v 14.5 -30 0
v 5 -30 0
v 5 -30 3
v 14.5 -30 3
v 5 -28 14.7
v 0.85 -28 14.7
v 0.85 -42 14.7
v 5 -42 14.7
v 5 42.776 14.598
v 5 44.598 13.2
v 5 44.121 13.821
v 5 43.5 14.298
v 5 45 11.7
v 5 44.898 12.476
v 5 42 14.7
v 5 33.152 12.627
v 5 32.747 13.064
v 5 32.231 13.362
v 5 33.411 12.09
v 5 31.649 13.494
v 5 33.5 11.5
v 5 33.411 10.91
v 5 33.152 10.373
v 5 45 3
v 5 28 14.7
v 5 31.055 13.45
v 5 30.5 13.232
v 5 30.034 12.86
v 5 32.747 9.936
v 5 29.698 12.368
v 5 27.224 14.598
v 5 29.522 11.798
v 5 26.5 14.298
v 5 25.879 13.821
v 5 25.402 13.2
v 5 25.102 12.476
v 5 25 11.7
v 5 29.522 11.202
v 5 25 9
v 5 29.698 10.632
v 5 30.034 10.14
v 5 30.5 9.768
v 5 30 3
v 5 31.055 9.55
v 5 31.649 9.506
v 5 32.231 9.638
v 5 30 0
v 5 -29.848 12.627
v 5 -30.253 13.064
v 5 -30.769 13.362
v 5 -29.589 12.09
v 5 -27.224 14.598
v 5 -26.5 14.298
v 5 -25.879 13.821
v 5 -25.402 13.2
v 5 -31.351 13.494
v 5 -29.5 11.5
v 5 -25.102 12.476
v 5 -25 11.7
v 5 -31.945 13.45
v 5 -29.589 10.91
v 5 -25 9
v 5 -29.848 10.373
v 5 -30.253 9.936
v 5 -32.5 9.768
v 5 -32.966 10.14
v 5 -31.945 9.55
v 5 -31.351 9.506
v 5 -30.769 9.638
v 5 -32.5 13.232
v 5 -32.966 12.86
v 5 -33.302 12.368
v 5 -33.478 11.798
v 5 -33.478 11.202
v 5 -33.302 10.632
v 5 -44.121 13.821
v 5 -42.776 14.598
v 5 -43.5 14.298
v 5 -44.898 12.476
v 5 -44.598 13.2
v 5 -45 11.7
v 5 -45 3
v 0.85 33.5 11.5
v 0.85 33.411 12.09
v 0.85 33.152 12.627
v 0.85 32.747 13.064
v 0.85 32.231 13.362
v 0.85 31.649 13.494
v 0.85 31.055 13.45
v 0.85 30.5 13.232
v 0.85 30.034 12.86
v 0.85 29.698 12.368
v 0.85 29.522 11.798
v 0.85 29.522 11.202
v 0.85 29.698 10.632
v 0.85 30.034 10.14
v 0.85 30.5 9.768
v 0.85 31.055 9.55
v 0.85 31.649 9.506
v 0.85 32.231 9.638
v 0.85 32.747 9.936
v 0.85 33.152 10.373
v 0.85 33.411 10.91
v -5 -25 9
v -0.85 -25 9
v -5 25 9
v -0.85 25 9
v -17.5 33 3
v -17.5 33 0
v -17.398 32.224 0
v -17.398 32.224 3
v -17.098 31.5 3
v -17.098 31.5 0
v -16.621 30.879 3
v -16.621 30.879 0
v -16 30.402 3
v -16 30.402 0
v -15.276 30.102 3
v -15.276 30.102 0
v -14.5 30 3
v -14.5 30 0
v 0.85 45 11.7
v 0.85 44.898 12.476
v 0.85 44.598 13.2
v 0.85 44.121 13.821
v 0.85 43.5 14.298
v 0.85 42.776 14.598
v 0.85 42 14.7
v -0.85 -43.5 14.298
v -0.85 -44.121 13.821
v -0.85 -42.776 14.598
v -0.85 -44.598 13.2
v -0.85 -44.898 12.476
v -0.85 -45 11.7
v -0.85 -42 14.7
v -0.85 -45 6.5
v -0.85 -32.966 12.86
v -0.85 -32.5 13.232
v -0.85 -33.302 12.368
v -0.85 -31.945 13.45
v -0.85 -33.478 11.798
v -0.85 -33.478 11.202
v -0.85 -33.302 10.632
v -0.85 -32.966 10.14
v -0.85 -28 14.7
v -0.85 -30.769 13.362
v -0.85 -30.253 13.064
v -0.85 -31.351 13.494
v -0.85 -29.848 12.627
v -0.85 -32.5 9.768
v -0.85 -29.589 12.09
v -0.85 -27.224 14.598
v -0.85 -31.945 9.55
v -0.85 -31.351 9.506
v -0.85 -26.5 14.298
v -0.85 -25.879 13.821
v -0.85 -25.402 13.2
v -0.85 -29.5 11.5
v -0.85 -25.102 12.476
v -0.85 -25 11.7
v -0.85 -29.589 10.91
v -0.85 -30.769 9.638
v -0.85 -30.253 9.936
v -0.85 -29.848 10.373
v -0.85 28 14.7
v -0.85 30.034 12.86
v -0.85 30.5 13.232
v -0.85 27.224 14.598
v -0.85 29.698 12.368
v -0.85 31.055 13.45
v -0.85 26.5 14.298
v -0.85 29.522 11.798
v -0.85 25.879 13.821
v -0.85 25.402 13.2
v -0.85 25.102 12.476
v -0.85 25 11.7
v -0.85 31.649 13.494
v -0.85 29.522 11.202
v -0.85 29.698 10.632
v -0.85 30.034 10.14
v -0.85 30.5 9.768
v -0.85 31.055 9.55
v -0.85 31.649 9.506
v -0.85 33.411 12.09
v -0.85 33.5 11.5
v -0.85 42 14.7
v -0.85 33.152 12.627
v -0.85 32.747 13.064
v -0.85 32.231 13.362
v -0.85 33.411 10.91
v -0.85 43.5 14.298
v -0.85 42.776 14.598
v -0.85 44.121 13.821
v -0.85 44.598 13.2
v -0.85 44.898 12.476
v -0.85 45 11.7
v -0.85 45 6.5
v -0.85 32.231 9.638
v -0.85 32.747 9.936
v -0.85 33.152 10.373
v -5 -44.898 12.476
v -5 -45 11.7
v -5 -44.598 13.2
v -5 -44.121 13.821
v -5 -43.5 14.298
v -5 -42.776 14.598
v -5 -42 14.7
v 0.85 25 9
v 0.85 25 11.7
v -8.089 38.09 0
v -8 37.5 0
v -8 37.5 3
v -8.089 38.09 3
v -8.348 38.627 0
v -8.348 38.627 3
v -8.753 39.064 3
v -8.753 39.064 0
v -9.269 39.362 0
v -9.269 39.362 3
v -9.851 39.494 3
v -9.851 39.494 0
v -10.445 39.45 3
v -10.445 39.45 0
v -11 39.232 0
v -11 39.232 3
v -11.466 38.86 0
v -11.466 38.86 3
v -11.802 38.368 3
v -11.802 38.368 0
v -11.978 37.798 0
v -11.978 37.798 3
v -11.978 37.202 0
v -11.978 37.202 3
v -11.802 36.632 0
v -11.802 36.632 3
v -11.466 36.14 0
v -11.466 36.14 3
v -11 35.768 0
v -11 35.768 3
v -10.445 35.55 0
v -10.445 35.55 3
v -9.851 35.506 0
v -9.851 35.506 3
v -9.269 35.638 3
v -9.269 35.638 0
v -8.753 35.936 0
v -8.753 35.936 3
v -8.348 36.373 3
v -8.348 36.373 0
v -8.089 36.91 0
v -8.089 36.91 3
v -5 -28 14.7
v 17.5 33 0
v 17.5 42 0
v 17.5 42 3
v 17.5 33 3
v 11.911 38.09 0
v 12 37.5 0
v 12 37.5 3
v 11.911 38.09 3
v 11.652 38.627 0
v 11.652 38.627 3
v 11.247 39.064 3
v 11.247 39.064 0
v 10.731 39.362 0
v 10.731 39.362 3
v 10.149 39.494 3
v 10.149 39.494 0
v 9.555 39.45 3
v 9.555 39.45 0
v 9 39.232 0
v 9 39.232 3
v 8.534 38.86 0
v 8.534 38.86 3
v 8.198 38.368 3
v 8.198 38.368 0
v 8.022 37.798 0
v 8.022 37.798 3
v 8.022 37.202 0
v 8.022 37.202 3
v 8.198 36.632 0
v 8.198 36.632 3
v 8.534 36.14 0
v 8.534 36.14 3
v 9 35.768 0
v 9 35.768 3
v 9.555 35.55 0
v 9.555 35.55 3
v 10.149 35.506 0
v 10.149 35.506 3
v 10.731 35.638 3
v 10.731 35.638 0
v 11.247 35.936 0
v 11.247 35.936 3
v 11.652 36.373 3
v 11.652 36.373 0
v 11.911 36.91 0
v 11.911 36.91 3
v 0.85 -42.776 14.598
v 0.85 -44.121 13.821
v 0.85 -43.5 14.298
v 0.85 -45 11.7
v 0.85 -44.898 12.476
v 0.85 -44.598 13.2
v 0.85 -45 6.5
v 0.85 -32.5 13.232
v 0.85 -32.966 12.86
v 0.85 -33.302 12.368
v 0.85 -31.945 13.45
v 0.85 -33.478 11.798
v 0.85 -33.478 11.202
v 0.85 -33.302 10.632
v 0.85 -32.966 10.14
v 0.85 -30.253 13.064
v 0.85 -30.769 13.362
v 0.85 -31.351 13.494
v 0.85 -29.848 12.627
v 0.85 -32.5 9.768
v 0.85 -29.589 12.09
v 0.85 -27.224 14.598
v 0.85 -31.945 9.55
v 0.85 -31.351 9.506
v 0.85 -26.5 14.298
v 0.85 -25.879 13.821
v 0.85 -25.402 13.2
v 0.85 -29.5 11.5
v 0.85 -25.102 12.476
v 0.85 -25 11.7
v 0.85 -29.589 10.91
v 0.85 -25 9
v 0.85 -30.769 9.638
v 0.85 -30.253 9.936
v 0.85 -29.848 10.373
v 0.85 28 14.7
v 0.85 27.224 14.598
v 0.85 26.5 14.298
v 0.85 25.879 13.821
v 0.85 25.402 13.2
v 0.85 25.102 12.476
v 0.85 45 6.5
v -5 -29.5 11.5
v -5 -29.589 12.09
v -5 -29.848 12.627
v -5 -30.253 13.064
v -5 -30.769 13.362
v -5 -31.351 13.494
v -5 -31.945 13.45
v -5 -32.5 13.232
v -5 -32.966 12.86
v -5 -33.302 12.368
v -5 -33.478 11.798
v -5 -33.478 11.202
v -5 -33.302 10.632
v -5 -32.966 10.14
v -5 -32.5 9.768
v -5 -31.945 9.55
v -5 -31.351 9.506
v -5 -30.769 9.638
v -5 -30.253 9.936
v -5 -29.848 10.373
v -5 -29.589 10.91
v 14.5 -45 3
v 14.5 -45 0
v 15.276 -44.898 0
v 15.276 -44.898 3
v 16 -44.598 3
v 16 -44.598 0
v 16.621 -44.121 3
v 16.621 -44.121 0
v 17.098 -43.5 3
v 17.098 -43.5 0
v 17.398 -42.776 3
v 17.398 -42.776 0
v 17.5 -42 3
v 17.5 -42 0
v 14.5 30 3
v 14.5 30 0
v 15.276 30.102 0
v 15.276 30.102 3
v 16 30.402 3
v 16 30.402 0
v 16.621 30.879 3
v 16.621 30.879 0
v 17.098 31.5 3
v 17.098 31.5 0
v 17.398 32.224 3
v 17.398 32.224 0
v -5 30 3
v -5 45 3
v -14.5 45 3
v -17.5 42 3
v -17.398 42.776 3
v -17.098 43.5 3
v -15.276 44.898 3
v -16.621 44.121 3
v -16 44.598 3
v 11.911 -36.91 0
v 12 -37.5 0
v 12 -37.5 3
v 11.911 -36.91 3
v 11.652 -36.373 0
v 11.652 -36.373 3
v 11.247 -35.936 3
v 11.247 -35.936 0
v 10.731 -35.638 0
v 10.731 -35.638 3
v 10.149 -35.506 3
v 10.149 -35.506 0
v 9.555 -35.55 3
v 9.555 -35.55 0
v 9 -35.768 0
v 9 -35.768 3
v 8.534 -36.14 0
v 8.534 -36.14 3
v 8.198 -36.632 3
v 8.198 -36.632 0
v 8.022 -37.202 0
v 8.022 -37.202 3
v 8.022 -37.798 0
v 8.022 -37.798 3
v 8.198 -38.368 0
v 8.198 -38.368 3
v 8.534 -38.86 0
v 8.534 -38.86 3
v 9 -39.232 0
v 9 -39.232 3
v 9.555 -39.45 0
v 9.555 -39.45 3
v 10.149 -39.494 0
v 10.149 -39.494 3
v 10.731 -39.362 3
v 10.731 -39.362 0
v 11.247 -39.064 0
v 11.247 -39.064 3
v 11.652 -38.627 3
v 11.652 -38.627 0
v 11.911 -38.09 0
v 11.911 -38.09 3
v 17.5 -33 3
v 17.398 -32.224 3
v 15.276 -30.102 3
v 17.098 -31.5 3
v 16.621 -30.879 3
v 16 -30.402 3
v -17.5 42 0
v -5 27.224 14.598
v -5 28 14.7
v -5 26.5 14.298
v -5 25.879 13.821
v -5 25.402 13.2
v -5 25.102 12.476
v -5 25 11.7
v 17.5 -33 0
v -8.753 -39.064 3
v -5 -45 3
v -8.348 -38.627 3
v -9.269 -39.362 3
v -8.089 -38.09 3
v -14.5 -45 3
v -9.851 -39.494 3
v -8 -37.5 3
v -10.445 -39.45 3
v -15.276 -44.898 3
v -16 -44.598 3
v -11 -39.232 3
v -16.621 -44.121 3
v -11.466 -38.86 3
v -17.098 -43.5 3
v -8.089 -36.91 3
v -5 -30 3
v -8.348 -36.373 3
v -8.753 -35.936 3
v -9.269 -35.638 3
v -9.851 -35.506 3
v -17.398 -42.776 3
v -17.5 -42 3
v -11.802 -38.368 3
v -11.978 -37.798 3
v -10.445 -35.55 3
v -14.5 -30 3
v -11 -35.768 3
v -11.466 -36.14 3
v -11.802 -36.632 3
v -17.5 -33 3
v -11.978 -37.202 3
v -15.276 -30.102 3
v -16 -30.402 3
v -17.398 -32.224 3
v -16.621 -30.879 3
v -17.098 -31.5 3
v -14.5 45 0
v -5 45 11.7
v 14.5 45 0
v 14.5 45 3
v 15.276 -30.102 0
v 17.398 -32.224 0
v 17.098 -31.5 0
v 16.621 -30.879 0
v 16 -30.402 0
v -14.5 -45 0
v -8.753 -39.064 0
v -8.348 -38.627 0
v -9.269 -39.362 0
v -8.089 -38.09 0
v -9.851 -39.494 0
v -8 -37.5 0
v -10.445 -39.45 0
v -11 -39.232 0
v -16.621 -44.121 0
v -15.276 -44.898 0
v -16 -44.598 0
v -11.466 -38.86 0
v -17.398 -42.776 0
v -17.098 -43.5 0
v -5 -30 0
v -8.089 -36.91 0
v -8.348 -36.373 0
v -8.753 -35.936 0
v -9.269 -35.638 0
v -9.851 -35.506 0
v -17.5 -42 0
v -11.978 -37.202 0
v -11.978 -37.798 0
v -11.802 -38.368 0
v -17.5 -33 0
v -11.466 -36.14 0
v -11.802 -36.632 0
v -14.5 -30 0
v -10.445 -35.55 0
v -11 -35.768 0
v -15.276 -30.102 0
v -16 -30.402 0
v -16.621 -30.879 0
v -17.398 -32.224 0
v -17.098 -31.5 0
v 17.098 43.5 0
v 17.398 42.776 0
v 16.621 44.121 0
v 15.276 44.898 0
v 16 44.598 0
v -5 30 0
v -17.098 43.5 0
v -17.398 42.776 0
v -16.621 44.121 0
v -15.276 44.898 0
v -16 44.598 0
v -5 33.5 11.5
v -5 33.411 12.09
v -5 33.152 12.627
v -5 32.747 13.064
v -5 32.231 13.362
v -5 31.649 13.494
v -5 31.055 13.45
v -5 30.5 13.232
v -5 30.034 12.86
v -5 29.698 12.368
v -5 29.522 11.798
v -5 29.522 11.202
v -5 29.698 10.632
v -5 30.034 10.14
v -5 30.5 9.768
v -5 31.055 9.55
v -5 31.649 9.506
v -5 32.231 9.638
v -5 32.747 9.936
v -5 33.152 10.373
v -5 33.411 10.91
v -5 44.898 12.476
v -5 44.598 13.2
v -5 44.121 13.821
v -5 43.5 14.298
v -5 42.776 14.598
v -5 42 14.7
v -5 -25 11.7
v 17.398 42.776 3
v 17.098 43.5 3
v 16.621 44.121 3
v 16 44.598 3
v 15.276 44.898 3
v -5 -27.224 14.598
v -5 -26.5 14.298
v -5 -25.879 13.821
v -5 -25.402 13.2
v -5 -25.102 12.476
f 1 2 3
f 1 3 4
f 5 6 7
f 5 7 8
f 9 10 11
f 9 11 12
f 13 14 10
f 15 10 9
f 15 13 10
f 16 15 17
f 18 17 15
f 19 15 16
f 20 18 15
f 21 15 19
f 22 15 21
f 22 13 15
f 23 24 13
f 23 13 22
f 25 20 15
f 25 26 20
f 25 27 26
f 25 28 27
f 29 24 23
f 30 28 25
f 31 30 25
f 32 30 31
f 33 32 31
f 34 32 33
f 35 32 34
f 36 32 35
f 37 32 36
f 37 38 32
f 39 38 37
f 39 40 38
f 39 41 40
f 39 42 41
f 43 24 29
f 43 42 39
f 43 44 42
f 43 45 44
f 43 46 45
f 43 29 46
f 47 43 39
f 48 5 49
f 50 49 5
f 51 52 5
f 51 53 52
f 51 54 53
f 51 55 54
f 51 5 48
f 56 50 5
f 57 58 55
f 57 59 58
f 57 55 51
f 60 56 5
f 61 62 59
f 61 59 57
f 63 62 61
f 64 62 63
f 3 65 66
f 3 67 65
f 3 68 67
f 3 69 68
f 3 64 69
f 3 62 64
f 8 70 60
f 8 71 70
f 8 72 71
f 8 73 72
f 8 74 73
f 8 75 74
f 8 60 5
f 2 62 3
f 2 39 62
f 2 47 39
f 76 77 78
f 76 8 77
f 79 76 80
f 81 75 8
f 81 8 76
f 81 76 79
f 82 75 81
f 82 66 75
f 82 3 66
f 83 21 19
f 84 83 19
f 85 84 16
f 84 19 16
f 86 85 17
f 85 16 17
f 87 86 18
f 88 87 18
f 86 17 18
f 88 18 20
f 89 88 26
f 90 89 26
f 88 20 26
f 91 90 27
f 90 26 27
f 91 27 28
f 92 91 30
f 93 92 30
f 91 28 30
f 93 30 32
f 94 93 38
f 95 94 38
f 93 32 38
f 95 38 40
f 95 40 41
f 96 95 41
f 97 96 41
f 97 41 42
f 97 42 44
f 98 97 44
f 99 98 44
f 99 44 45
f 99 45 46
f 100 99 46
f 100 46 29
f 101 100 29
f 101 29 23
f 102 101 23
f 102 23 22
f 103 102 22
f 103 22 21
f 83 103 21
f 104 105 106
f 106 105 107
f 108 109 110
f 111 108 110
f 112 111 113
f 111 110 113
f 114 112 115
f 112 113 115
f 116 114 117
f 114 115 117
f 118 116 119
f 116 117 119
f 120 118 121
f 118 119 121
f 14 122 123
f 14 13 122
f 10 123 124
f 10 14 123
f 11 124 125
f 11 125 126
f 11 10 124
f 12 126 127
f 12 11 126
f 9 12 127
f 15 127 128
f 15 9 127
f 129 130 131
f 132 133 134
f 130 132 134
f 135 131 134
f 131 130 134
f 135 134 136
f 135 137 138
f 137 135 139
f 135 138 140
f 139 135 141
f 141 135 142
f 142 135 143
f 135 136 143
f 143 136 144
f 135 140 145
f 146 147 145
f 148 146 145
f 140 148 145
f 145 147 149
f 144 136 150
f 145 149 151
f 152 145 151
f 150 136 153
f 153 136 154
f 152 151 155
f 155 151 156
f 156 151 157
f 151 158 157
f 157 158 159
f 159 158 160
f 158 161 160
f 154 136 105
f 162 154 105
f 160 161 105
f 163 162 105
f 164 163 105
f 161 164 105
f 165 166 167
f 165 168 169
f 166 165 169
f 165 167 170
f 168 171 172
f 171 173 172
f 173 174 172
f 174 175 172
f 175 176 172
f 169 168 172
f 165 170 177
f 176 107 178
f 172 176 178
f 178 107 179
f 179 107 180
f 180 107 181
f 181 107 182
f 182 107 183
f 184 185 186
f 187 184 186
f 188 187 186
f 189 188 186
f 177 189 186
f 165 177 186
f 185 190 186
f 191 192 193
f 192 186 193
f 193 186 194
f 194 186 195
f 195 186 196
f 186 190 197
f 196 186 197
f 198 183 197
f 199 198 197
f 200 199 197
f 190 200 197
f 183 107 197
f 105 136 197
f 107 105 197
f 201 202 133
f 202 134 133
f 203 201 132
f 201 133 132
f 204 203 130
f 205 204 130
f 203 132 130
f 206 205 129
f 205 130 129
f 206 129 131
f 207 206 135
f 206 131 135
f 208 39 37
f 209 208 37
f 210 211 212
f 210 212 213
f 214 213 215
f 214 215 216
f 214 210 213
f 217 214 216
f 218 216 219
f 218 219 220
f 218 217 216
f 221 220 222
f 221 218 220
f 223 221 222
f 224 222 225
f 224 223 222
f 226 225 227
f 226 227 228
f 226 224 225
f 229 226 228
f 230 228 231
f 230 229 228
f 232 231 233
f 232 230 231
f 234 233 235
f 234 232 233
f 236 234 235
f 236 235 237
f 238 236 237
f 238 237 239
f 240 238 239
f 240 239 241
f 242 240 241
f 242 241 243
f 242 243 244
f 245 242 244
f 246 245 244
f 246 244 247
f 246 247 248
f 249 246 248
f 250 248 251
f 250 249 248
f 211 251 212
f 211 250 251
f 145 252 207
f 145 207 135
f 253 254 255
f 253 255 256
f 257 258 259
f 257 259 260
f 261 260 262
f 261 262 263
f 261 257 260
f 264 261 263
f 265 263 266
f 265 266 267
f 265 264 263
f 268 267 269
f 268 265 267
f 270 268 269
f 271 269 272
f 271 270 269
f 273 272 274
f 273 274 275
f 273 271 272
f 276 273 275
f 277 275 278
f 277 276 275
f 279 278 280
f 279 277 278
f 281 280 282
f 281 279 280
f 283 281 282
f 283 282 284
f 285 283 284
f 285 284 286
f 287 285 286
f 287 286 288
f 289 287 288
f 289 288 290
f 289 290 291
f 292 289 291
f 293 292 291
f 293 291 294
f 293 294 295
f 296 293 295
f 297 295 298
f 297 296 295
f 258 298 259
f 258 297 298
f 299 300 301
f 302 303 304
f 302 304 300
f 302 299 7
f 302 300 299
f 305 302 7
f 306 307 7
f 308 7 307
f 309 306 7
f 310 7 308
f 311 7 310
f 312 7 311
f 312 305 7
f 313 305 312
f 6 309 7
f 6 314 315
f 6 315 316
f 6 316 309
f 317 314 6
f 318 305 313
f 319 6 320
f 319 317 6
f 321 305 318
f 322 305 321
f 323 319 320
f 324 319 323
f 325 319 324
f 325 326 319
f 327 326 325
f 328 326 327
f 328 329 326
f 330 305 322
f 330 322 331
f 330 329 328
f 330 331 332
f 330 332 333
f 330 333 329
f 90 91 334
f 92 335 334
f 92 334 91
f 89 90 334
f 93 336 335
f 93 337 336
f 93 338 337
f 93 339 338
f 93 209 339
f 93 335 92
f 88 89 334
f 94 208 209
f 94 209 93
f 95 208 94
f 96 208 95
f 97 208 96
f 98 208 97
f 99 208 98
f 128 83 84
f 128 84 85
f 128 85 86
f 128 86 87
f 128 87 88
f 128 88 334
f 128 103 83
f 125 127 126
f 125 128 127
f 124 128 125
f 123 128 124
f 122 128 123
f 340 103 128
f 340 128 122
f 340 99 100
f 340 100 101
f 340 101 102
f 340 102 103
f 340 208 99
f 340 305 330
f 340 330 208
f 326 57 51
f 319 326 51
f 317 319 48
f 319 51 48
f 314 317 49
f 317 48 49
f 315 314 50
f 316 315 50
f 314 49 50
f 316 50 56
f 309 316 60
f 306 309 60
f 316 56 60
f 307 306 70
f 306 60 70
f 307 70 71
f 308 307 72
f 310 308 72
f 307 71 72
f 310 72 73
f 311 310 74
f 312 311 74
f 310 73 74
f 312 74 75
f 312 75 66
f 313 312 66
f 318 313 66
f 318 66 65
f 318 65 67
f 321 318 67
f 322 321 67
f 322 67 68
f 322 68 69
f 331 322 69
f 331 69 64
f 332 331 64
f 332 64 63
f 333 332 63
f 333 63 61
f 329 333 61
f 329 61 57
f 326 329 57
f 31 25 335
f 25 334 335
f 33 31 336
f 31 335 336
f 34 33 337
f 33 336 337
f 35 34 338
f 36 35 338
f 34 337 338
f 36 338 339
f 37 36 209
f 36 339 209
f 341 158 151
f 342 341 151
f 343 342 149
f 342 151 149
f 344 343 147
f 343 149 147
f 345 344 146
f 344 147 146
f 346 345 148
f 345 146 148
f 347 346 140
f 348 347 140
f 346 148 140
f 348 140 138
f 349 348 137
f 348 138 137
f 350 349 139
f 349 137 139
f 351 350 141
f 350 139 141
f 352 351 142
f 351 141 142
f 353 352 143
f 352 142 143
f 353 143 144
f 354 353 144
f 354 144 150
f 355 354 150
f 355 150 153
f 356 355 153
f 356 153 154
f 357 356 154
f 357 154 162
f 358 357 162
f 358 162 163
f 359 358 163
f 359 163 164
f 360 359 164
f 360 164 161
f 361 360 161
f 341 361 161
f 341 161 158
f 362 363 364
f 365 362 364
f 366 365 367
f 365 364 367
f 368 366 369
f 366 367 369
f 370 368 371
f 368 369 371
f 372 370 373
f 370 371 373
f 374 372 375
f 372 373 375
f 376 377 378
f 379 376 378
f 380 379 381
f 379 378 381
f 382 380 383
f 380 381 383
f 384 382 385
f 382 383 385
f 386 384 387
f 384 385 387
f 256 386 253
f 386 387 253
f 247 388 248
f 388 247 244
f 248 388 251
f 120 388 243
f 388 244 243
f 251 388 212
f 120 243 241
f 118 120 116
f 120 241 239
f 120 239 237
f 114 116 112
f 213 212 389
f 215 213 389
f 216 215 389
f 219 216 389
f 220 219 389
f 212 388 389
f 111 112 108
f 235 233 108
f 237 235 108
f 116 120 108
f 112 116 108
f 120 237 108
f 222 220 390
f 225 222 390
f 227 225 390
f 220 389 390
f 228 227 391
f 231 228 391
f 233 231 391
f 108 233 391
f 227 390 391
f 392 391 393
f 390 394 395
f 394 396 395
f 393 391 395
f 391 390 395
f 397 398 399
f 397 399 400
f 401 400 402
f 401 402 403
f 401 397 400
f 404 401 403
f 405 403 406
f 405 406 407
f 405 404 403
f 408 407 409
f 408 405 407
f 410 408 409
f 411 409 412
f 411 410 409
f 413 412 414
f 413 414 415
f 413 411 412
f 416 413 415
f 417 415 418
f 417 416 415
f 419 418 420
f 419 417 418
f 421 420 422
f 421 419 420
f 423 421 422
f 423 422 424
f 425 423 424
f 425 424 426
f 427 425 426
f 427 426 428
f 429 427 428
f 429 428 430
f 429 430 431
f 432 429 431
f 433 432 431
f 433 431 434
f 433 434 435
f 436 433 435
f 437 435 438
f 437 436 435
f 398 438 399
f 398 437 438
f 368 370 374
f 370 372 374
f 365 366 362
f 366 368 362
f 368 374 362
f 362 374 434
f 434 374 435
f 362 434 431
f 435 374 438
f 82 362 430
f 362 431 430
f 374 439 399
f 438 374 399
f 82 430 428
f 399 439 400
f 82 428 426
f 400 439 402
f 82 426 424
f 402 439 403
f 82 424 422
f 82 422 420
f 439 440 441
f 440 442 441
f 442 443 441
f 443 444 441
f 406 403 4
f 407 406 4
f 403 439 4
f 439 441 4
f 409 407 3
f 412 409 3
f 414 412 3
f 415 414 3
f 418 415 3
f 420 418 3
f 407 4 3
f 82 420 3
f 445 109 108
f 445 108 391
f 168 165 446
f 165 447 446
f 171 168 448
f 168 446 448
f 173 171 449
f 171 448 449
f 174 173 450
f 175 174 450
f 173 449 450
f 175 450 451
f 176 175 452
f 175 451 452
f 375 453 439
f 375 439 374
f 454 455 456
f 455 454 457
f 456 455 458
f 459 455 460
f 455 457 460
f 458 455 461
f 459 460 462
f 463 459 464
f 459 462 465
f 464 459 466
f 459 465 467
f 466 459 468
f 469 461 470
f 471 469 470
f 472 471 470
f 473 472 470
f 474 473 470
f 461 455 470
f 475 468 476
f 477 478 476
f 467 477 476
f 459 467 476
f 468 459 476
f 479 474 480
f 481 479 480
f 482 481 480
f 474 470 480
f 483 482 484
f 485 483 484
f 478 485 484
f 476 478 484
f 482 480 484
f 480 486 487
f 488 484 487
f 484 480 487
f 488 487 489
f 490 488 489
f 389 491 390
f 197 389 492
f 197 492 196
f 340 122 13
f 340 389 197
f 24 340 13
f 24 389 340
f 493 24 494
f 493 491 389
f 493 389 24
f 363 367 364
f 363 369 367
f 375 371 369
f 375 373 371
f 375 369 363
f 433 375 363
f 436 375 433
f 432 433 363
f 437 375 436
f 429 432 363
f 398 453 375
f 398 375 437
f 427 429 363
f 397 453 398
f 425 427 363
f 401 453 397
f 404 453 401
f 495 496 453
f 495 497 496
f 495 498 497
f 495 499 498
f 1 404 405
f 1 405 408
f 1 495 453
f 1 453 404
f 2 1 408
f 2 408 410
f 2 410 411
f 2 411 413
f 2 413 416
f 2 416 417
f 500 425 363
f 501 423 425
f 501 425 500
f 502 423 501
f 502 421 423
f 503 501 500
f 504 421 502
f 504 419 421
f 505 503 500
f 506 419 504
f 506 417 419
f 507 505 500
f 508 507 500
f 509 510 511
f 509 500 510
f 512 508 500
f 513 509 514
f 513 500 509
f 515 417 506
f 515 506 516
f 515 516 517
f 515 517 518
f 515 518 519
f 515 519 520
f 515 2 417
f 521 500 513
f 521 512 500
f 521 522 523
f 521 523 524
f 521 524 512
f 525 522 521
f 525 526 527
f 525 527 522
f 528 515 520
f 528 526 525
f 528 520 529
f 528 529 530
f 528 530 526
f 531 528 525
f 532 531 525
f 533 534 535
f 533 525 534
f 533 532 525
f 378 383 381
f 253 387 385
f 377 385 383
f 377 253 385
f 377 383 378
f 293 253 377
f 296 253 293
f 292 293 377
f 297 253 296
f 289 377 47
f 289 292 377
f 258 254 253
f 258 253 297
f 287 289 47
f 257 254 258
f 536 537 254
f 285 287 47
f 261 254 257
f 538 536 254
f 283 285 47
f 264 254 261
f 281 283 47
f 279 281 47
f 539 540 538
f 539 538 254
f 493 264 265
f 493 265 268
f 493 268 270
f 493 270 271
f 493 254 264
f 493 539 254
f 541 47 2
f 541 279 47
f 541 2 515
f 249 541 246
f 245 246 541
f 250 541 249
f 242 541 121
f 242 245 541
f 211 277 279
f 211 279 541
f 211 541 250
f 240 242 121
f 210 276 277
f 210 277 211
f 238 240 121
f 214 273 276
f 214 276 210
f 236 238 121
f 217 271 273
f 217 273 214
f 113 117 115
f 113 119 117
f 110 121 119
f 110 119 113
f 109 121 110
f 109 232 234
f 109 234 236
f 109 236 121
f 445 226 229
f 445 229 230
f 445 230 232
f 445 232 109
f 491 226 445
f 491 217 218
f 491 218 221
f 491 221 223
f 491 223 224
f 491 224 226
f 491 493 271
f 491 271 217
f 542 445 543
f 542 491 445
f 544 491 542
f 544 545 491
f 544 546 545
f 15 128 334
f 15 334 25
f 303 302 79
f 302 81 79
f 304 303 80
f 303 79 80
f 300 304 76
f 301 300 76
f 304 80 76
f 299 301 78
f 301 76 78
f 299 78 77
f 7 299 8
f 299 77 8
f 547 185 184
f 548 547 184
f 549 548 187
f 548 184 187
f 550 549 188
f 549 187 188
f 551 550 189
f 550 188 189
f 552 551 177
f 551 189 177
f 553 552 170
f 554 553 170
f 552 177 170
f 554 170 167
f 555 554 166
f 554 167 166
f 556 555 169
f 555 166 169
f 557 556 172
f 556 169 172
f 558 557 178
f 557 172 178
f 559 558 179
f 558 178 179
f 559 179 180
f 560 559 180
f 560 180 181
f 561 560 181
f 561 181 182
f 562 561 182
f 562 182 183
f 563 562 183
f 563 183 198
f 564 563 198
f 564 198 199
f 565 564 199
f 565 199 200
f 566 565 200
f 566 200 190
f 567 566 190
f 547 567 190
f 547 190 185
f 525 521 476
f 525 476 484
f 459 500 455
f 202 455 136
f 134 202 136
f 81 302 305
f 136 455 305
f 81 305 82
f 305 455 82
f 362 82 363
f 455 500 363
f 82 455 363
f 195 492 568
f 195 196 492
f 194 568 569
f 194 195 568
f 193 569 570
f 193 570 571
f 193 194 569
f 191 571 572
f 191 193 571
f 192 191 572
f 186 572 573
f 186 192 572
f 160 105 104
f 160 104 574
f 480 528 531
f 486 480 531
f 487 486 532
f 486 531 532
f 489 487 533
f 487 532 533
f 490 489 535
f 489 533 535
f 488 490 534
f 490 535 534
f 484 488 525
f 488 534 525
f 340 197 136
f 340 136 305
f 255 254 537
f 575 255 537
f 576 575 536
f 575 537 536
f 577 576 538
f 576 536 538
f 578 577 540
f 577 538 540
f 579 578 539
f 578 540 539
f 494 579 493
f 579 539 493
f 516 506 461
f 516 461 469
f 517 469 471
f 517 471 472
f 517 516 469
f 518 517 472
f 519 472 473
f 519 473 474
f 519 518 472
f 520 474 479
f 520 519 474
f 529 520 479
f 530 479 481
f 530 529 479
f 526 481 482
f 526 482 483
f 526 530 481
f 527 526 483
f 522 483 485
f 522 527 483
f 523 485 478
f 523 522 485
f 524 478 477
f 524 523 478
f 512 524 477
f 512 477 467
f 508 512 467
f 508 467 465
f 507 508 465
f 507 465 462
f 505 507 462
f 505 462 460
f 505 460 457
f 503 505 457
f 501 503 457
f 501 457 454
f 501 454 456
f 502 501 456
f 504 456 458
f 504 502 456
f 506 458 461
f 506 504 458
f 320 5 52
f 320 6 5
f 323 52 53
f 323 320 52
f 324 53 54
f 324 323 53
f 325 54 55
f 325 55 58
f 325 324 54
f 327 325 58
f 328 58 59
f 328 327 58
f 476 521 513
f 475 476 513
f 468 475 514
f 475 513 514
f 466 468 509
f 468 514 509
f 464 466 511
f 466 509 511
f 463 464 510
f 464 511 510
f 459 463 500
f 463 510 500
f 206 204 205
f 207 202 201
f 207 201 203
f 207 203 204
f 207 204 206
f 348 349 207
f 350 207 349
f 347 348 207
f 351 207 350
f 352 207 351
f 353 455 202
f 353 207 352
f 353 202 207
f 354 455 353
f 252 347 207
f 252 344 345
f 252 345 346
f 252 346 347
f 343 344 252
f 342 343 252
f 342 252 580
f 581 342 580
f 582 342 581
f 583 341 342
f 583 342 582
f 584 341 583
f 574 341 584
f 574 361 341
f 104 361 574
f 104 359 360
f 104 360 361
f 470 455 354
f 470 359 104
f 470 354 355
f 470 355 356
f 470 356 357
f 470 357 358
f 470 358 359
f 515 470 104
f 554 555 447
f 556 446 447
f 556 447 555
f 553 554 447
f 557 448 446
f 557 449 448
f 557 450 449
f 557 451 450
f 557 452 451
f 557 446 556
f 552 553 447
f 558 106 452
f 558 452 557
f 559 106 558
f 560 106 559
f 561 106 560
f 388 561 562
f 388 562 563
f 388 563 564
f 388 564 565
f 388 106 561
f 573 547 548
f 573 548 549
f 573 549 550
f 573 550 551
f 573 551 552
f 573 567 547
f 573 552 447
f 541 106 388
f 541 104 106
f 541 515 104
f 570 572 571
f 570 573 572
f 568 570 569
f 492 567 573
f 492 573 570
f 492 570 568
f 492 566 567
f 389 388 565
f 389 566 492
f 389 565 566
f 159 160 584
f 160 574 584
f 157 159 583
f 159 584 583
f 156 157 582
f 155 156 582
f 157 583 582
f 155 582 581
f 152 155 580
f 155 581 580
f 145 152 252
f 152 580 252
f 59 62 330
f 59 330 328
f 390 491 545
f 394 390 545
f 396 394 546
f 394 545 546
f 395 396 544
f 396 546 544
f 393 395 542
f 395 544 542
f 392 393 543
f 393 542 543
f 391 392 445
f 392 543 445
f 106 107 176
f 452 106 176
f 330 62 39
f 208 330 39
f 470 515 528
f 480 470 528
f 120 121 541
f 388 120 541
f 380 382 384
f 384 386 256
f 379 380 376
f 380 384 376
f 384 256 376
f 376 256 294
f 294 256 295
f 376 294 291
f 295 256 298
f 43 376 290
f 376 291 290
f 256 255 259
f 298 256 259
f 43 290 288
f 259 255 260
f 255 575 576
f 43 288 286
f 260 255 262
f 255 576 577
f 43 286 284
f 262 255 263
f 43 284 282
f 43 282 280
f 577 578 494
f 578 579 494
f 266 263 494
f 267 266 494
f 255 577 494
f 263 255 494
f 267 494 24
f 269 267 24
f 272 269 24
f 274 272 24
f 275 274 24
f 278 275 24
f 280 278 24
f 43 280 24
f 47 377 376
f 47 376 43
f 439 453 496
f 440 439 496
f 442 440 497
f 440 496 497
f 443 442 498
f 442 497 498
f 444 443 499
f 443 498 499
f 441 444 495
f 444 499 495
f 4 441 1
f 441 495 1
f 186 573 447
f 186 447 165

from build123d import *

# Parameters (mm, degrees)
SKETCH_R     = 2
PAD_DEPTH    = 3
SKETCH001_W  = 4.15
SKETCH001_H  = 90
PAD001_DEPTH = 11.7
SKETCH002_R  = 2
SKETCH002_W  = 50
SKETCH002_H  = 6
POCKET_DEPTH = 15
SKETCH003_W  = 4.09
SKETCH003_H  = 90
PAD002_DEPTH = 3.5
FILLET_R     = 3


with BuildPart() as part:
    # Sketch → Pad (new body)
    with BuildSketch(Plane.XY):
        with BuildLine():
            Line((-14.5, 45), (14.5, 45))
            ThreePointArc((17.5, 42), (16.62132, 44.12132), (14.5, 45))
            Line((17.5, 42), (17.5, 33))
            ThreePointArc((14.5, 30), (16.62132, 30.87868), (17.5, 33))
            Line((14.5, 30), (5, 30))
            Line((5, 30), (5, -30))
            Line((5, -30), (14.5, -30))
            ThreePointArc((17.5, -33), (16.62132, -30.87868), (14.5, -30))
            Line((17.5, -33), (17.5, -42))
            ThreePointArc((14.5, -45), (16.62132, -44.12132), (17.5, -42))
            Line((14.5, -45), (-14.5, -45))
            ThreePointArc((-17.5, -42), (-16.62132, -44.12132), (-14.5, -45))
            Line((-17.5, -42), (-17.5, -33))
            ThreePointArc((-14.5, -30), (-16.62132, -30.87868), (-17.5, -33))
            Line((-5, -30), (-14.5, -30))
            Line((-5, 30), (-5, -30))
            Line((-14.5, 30), (-5, 30))
            ThreePointArc((-17.5, 33), (-16.62132, 30.87868), (-14.5, 30))
            Line((-17.5, 33), (-17.5, 42))
            ThreePointArc((-14.5, 45), (-16.62132, 44.12132), (-17.5, 42))
        make_face()
        with Locations((-10, 37.5)):
            Circle(SKETCH_R, mode=Mode.SUBTRACT)
        with Locations((10, 37.5)):
            Circle(SKETCH_R, mode=Mode.SUBTRACT)
        with Locations((-10, -37.5)):
            Circle(SKETCH_R, mode=Mode.SUBTRACT)
        with Locations((10, -37.5)):
            Circle(SKETCH_R, mode=Mode.SUBTRACT)
    extrude(amount=PAD_DEPTH)

    # Sketch001 → Pad001 (join)
    with BuildSketch(Plane.XY.offset(3)):
        with Locations((-2.925, 0)):
            Rectangle(SKETCH001_W, SKETCH001_H)
        with Locations((2.925, 0)):
            Rectangle(SKETCH001_W, SKETCH001_H)
    extrude(amount=PAD001_DEPTH)

    # Sketch002 → Pocket (cut)
    with BuildSketch(Plane.YZ.offset(5)):
        with Locations((-31.5, 11.5)):
            Circle(SKETCH002_R)
        with Locations((31.5, 11.5)):
            Circle(SKETCH002_R)
        with Locations((0, 12)):
            Rectangle(SKETCH002_W, SKETCH002_H)
    extrude(amount=-POCKET_DEPTH, mode=Mode.SUBTRACT)

    # Sketch003 → Pad002 (join)
    with BuildSketch(Plane.XY.offset(3)):
        with Locations((0.341939, 0)):
            Rectangle(SKETCH003_W, SKETCH003_H)
    extrude(amount=PAD002_DEPTH)

    # Fillet
    fillet_edges = [part.edges().sort_by_distance(p)[0] for p in [
        (-2.925, -45, 14.7),
        (2.925, -45, 14.7),
        (-2.925, -25, 14.7),
        (2.925, -25, 14.7),
        (-2.925, 25, 14.7),
        (2.925, 25, 14.7),
        (-2.925, 45, 14.7),
        (2.925, 45, 14.7),
    ]]
    fillet(fillet_edges, radius=FILLET_R)


solid = part.part
